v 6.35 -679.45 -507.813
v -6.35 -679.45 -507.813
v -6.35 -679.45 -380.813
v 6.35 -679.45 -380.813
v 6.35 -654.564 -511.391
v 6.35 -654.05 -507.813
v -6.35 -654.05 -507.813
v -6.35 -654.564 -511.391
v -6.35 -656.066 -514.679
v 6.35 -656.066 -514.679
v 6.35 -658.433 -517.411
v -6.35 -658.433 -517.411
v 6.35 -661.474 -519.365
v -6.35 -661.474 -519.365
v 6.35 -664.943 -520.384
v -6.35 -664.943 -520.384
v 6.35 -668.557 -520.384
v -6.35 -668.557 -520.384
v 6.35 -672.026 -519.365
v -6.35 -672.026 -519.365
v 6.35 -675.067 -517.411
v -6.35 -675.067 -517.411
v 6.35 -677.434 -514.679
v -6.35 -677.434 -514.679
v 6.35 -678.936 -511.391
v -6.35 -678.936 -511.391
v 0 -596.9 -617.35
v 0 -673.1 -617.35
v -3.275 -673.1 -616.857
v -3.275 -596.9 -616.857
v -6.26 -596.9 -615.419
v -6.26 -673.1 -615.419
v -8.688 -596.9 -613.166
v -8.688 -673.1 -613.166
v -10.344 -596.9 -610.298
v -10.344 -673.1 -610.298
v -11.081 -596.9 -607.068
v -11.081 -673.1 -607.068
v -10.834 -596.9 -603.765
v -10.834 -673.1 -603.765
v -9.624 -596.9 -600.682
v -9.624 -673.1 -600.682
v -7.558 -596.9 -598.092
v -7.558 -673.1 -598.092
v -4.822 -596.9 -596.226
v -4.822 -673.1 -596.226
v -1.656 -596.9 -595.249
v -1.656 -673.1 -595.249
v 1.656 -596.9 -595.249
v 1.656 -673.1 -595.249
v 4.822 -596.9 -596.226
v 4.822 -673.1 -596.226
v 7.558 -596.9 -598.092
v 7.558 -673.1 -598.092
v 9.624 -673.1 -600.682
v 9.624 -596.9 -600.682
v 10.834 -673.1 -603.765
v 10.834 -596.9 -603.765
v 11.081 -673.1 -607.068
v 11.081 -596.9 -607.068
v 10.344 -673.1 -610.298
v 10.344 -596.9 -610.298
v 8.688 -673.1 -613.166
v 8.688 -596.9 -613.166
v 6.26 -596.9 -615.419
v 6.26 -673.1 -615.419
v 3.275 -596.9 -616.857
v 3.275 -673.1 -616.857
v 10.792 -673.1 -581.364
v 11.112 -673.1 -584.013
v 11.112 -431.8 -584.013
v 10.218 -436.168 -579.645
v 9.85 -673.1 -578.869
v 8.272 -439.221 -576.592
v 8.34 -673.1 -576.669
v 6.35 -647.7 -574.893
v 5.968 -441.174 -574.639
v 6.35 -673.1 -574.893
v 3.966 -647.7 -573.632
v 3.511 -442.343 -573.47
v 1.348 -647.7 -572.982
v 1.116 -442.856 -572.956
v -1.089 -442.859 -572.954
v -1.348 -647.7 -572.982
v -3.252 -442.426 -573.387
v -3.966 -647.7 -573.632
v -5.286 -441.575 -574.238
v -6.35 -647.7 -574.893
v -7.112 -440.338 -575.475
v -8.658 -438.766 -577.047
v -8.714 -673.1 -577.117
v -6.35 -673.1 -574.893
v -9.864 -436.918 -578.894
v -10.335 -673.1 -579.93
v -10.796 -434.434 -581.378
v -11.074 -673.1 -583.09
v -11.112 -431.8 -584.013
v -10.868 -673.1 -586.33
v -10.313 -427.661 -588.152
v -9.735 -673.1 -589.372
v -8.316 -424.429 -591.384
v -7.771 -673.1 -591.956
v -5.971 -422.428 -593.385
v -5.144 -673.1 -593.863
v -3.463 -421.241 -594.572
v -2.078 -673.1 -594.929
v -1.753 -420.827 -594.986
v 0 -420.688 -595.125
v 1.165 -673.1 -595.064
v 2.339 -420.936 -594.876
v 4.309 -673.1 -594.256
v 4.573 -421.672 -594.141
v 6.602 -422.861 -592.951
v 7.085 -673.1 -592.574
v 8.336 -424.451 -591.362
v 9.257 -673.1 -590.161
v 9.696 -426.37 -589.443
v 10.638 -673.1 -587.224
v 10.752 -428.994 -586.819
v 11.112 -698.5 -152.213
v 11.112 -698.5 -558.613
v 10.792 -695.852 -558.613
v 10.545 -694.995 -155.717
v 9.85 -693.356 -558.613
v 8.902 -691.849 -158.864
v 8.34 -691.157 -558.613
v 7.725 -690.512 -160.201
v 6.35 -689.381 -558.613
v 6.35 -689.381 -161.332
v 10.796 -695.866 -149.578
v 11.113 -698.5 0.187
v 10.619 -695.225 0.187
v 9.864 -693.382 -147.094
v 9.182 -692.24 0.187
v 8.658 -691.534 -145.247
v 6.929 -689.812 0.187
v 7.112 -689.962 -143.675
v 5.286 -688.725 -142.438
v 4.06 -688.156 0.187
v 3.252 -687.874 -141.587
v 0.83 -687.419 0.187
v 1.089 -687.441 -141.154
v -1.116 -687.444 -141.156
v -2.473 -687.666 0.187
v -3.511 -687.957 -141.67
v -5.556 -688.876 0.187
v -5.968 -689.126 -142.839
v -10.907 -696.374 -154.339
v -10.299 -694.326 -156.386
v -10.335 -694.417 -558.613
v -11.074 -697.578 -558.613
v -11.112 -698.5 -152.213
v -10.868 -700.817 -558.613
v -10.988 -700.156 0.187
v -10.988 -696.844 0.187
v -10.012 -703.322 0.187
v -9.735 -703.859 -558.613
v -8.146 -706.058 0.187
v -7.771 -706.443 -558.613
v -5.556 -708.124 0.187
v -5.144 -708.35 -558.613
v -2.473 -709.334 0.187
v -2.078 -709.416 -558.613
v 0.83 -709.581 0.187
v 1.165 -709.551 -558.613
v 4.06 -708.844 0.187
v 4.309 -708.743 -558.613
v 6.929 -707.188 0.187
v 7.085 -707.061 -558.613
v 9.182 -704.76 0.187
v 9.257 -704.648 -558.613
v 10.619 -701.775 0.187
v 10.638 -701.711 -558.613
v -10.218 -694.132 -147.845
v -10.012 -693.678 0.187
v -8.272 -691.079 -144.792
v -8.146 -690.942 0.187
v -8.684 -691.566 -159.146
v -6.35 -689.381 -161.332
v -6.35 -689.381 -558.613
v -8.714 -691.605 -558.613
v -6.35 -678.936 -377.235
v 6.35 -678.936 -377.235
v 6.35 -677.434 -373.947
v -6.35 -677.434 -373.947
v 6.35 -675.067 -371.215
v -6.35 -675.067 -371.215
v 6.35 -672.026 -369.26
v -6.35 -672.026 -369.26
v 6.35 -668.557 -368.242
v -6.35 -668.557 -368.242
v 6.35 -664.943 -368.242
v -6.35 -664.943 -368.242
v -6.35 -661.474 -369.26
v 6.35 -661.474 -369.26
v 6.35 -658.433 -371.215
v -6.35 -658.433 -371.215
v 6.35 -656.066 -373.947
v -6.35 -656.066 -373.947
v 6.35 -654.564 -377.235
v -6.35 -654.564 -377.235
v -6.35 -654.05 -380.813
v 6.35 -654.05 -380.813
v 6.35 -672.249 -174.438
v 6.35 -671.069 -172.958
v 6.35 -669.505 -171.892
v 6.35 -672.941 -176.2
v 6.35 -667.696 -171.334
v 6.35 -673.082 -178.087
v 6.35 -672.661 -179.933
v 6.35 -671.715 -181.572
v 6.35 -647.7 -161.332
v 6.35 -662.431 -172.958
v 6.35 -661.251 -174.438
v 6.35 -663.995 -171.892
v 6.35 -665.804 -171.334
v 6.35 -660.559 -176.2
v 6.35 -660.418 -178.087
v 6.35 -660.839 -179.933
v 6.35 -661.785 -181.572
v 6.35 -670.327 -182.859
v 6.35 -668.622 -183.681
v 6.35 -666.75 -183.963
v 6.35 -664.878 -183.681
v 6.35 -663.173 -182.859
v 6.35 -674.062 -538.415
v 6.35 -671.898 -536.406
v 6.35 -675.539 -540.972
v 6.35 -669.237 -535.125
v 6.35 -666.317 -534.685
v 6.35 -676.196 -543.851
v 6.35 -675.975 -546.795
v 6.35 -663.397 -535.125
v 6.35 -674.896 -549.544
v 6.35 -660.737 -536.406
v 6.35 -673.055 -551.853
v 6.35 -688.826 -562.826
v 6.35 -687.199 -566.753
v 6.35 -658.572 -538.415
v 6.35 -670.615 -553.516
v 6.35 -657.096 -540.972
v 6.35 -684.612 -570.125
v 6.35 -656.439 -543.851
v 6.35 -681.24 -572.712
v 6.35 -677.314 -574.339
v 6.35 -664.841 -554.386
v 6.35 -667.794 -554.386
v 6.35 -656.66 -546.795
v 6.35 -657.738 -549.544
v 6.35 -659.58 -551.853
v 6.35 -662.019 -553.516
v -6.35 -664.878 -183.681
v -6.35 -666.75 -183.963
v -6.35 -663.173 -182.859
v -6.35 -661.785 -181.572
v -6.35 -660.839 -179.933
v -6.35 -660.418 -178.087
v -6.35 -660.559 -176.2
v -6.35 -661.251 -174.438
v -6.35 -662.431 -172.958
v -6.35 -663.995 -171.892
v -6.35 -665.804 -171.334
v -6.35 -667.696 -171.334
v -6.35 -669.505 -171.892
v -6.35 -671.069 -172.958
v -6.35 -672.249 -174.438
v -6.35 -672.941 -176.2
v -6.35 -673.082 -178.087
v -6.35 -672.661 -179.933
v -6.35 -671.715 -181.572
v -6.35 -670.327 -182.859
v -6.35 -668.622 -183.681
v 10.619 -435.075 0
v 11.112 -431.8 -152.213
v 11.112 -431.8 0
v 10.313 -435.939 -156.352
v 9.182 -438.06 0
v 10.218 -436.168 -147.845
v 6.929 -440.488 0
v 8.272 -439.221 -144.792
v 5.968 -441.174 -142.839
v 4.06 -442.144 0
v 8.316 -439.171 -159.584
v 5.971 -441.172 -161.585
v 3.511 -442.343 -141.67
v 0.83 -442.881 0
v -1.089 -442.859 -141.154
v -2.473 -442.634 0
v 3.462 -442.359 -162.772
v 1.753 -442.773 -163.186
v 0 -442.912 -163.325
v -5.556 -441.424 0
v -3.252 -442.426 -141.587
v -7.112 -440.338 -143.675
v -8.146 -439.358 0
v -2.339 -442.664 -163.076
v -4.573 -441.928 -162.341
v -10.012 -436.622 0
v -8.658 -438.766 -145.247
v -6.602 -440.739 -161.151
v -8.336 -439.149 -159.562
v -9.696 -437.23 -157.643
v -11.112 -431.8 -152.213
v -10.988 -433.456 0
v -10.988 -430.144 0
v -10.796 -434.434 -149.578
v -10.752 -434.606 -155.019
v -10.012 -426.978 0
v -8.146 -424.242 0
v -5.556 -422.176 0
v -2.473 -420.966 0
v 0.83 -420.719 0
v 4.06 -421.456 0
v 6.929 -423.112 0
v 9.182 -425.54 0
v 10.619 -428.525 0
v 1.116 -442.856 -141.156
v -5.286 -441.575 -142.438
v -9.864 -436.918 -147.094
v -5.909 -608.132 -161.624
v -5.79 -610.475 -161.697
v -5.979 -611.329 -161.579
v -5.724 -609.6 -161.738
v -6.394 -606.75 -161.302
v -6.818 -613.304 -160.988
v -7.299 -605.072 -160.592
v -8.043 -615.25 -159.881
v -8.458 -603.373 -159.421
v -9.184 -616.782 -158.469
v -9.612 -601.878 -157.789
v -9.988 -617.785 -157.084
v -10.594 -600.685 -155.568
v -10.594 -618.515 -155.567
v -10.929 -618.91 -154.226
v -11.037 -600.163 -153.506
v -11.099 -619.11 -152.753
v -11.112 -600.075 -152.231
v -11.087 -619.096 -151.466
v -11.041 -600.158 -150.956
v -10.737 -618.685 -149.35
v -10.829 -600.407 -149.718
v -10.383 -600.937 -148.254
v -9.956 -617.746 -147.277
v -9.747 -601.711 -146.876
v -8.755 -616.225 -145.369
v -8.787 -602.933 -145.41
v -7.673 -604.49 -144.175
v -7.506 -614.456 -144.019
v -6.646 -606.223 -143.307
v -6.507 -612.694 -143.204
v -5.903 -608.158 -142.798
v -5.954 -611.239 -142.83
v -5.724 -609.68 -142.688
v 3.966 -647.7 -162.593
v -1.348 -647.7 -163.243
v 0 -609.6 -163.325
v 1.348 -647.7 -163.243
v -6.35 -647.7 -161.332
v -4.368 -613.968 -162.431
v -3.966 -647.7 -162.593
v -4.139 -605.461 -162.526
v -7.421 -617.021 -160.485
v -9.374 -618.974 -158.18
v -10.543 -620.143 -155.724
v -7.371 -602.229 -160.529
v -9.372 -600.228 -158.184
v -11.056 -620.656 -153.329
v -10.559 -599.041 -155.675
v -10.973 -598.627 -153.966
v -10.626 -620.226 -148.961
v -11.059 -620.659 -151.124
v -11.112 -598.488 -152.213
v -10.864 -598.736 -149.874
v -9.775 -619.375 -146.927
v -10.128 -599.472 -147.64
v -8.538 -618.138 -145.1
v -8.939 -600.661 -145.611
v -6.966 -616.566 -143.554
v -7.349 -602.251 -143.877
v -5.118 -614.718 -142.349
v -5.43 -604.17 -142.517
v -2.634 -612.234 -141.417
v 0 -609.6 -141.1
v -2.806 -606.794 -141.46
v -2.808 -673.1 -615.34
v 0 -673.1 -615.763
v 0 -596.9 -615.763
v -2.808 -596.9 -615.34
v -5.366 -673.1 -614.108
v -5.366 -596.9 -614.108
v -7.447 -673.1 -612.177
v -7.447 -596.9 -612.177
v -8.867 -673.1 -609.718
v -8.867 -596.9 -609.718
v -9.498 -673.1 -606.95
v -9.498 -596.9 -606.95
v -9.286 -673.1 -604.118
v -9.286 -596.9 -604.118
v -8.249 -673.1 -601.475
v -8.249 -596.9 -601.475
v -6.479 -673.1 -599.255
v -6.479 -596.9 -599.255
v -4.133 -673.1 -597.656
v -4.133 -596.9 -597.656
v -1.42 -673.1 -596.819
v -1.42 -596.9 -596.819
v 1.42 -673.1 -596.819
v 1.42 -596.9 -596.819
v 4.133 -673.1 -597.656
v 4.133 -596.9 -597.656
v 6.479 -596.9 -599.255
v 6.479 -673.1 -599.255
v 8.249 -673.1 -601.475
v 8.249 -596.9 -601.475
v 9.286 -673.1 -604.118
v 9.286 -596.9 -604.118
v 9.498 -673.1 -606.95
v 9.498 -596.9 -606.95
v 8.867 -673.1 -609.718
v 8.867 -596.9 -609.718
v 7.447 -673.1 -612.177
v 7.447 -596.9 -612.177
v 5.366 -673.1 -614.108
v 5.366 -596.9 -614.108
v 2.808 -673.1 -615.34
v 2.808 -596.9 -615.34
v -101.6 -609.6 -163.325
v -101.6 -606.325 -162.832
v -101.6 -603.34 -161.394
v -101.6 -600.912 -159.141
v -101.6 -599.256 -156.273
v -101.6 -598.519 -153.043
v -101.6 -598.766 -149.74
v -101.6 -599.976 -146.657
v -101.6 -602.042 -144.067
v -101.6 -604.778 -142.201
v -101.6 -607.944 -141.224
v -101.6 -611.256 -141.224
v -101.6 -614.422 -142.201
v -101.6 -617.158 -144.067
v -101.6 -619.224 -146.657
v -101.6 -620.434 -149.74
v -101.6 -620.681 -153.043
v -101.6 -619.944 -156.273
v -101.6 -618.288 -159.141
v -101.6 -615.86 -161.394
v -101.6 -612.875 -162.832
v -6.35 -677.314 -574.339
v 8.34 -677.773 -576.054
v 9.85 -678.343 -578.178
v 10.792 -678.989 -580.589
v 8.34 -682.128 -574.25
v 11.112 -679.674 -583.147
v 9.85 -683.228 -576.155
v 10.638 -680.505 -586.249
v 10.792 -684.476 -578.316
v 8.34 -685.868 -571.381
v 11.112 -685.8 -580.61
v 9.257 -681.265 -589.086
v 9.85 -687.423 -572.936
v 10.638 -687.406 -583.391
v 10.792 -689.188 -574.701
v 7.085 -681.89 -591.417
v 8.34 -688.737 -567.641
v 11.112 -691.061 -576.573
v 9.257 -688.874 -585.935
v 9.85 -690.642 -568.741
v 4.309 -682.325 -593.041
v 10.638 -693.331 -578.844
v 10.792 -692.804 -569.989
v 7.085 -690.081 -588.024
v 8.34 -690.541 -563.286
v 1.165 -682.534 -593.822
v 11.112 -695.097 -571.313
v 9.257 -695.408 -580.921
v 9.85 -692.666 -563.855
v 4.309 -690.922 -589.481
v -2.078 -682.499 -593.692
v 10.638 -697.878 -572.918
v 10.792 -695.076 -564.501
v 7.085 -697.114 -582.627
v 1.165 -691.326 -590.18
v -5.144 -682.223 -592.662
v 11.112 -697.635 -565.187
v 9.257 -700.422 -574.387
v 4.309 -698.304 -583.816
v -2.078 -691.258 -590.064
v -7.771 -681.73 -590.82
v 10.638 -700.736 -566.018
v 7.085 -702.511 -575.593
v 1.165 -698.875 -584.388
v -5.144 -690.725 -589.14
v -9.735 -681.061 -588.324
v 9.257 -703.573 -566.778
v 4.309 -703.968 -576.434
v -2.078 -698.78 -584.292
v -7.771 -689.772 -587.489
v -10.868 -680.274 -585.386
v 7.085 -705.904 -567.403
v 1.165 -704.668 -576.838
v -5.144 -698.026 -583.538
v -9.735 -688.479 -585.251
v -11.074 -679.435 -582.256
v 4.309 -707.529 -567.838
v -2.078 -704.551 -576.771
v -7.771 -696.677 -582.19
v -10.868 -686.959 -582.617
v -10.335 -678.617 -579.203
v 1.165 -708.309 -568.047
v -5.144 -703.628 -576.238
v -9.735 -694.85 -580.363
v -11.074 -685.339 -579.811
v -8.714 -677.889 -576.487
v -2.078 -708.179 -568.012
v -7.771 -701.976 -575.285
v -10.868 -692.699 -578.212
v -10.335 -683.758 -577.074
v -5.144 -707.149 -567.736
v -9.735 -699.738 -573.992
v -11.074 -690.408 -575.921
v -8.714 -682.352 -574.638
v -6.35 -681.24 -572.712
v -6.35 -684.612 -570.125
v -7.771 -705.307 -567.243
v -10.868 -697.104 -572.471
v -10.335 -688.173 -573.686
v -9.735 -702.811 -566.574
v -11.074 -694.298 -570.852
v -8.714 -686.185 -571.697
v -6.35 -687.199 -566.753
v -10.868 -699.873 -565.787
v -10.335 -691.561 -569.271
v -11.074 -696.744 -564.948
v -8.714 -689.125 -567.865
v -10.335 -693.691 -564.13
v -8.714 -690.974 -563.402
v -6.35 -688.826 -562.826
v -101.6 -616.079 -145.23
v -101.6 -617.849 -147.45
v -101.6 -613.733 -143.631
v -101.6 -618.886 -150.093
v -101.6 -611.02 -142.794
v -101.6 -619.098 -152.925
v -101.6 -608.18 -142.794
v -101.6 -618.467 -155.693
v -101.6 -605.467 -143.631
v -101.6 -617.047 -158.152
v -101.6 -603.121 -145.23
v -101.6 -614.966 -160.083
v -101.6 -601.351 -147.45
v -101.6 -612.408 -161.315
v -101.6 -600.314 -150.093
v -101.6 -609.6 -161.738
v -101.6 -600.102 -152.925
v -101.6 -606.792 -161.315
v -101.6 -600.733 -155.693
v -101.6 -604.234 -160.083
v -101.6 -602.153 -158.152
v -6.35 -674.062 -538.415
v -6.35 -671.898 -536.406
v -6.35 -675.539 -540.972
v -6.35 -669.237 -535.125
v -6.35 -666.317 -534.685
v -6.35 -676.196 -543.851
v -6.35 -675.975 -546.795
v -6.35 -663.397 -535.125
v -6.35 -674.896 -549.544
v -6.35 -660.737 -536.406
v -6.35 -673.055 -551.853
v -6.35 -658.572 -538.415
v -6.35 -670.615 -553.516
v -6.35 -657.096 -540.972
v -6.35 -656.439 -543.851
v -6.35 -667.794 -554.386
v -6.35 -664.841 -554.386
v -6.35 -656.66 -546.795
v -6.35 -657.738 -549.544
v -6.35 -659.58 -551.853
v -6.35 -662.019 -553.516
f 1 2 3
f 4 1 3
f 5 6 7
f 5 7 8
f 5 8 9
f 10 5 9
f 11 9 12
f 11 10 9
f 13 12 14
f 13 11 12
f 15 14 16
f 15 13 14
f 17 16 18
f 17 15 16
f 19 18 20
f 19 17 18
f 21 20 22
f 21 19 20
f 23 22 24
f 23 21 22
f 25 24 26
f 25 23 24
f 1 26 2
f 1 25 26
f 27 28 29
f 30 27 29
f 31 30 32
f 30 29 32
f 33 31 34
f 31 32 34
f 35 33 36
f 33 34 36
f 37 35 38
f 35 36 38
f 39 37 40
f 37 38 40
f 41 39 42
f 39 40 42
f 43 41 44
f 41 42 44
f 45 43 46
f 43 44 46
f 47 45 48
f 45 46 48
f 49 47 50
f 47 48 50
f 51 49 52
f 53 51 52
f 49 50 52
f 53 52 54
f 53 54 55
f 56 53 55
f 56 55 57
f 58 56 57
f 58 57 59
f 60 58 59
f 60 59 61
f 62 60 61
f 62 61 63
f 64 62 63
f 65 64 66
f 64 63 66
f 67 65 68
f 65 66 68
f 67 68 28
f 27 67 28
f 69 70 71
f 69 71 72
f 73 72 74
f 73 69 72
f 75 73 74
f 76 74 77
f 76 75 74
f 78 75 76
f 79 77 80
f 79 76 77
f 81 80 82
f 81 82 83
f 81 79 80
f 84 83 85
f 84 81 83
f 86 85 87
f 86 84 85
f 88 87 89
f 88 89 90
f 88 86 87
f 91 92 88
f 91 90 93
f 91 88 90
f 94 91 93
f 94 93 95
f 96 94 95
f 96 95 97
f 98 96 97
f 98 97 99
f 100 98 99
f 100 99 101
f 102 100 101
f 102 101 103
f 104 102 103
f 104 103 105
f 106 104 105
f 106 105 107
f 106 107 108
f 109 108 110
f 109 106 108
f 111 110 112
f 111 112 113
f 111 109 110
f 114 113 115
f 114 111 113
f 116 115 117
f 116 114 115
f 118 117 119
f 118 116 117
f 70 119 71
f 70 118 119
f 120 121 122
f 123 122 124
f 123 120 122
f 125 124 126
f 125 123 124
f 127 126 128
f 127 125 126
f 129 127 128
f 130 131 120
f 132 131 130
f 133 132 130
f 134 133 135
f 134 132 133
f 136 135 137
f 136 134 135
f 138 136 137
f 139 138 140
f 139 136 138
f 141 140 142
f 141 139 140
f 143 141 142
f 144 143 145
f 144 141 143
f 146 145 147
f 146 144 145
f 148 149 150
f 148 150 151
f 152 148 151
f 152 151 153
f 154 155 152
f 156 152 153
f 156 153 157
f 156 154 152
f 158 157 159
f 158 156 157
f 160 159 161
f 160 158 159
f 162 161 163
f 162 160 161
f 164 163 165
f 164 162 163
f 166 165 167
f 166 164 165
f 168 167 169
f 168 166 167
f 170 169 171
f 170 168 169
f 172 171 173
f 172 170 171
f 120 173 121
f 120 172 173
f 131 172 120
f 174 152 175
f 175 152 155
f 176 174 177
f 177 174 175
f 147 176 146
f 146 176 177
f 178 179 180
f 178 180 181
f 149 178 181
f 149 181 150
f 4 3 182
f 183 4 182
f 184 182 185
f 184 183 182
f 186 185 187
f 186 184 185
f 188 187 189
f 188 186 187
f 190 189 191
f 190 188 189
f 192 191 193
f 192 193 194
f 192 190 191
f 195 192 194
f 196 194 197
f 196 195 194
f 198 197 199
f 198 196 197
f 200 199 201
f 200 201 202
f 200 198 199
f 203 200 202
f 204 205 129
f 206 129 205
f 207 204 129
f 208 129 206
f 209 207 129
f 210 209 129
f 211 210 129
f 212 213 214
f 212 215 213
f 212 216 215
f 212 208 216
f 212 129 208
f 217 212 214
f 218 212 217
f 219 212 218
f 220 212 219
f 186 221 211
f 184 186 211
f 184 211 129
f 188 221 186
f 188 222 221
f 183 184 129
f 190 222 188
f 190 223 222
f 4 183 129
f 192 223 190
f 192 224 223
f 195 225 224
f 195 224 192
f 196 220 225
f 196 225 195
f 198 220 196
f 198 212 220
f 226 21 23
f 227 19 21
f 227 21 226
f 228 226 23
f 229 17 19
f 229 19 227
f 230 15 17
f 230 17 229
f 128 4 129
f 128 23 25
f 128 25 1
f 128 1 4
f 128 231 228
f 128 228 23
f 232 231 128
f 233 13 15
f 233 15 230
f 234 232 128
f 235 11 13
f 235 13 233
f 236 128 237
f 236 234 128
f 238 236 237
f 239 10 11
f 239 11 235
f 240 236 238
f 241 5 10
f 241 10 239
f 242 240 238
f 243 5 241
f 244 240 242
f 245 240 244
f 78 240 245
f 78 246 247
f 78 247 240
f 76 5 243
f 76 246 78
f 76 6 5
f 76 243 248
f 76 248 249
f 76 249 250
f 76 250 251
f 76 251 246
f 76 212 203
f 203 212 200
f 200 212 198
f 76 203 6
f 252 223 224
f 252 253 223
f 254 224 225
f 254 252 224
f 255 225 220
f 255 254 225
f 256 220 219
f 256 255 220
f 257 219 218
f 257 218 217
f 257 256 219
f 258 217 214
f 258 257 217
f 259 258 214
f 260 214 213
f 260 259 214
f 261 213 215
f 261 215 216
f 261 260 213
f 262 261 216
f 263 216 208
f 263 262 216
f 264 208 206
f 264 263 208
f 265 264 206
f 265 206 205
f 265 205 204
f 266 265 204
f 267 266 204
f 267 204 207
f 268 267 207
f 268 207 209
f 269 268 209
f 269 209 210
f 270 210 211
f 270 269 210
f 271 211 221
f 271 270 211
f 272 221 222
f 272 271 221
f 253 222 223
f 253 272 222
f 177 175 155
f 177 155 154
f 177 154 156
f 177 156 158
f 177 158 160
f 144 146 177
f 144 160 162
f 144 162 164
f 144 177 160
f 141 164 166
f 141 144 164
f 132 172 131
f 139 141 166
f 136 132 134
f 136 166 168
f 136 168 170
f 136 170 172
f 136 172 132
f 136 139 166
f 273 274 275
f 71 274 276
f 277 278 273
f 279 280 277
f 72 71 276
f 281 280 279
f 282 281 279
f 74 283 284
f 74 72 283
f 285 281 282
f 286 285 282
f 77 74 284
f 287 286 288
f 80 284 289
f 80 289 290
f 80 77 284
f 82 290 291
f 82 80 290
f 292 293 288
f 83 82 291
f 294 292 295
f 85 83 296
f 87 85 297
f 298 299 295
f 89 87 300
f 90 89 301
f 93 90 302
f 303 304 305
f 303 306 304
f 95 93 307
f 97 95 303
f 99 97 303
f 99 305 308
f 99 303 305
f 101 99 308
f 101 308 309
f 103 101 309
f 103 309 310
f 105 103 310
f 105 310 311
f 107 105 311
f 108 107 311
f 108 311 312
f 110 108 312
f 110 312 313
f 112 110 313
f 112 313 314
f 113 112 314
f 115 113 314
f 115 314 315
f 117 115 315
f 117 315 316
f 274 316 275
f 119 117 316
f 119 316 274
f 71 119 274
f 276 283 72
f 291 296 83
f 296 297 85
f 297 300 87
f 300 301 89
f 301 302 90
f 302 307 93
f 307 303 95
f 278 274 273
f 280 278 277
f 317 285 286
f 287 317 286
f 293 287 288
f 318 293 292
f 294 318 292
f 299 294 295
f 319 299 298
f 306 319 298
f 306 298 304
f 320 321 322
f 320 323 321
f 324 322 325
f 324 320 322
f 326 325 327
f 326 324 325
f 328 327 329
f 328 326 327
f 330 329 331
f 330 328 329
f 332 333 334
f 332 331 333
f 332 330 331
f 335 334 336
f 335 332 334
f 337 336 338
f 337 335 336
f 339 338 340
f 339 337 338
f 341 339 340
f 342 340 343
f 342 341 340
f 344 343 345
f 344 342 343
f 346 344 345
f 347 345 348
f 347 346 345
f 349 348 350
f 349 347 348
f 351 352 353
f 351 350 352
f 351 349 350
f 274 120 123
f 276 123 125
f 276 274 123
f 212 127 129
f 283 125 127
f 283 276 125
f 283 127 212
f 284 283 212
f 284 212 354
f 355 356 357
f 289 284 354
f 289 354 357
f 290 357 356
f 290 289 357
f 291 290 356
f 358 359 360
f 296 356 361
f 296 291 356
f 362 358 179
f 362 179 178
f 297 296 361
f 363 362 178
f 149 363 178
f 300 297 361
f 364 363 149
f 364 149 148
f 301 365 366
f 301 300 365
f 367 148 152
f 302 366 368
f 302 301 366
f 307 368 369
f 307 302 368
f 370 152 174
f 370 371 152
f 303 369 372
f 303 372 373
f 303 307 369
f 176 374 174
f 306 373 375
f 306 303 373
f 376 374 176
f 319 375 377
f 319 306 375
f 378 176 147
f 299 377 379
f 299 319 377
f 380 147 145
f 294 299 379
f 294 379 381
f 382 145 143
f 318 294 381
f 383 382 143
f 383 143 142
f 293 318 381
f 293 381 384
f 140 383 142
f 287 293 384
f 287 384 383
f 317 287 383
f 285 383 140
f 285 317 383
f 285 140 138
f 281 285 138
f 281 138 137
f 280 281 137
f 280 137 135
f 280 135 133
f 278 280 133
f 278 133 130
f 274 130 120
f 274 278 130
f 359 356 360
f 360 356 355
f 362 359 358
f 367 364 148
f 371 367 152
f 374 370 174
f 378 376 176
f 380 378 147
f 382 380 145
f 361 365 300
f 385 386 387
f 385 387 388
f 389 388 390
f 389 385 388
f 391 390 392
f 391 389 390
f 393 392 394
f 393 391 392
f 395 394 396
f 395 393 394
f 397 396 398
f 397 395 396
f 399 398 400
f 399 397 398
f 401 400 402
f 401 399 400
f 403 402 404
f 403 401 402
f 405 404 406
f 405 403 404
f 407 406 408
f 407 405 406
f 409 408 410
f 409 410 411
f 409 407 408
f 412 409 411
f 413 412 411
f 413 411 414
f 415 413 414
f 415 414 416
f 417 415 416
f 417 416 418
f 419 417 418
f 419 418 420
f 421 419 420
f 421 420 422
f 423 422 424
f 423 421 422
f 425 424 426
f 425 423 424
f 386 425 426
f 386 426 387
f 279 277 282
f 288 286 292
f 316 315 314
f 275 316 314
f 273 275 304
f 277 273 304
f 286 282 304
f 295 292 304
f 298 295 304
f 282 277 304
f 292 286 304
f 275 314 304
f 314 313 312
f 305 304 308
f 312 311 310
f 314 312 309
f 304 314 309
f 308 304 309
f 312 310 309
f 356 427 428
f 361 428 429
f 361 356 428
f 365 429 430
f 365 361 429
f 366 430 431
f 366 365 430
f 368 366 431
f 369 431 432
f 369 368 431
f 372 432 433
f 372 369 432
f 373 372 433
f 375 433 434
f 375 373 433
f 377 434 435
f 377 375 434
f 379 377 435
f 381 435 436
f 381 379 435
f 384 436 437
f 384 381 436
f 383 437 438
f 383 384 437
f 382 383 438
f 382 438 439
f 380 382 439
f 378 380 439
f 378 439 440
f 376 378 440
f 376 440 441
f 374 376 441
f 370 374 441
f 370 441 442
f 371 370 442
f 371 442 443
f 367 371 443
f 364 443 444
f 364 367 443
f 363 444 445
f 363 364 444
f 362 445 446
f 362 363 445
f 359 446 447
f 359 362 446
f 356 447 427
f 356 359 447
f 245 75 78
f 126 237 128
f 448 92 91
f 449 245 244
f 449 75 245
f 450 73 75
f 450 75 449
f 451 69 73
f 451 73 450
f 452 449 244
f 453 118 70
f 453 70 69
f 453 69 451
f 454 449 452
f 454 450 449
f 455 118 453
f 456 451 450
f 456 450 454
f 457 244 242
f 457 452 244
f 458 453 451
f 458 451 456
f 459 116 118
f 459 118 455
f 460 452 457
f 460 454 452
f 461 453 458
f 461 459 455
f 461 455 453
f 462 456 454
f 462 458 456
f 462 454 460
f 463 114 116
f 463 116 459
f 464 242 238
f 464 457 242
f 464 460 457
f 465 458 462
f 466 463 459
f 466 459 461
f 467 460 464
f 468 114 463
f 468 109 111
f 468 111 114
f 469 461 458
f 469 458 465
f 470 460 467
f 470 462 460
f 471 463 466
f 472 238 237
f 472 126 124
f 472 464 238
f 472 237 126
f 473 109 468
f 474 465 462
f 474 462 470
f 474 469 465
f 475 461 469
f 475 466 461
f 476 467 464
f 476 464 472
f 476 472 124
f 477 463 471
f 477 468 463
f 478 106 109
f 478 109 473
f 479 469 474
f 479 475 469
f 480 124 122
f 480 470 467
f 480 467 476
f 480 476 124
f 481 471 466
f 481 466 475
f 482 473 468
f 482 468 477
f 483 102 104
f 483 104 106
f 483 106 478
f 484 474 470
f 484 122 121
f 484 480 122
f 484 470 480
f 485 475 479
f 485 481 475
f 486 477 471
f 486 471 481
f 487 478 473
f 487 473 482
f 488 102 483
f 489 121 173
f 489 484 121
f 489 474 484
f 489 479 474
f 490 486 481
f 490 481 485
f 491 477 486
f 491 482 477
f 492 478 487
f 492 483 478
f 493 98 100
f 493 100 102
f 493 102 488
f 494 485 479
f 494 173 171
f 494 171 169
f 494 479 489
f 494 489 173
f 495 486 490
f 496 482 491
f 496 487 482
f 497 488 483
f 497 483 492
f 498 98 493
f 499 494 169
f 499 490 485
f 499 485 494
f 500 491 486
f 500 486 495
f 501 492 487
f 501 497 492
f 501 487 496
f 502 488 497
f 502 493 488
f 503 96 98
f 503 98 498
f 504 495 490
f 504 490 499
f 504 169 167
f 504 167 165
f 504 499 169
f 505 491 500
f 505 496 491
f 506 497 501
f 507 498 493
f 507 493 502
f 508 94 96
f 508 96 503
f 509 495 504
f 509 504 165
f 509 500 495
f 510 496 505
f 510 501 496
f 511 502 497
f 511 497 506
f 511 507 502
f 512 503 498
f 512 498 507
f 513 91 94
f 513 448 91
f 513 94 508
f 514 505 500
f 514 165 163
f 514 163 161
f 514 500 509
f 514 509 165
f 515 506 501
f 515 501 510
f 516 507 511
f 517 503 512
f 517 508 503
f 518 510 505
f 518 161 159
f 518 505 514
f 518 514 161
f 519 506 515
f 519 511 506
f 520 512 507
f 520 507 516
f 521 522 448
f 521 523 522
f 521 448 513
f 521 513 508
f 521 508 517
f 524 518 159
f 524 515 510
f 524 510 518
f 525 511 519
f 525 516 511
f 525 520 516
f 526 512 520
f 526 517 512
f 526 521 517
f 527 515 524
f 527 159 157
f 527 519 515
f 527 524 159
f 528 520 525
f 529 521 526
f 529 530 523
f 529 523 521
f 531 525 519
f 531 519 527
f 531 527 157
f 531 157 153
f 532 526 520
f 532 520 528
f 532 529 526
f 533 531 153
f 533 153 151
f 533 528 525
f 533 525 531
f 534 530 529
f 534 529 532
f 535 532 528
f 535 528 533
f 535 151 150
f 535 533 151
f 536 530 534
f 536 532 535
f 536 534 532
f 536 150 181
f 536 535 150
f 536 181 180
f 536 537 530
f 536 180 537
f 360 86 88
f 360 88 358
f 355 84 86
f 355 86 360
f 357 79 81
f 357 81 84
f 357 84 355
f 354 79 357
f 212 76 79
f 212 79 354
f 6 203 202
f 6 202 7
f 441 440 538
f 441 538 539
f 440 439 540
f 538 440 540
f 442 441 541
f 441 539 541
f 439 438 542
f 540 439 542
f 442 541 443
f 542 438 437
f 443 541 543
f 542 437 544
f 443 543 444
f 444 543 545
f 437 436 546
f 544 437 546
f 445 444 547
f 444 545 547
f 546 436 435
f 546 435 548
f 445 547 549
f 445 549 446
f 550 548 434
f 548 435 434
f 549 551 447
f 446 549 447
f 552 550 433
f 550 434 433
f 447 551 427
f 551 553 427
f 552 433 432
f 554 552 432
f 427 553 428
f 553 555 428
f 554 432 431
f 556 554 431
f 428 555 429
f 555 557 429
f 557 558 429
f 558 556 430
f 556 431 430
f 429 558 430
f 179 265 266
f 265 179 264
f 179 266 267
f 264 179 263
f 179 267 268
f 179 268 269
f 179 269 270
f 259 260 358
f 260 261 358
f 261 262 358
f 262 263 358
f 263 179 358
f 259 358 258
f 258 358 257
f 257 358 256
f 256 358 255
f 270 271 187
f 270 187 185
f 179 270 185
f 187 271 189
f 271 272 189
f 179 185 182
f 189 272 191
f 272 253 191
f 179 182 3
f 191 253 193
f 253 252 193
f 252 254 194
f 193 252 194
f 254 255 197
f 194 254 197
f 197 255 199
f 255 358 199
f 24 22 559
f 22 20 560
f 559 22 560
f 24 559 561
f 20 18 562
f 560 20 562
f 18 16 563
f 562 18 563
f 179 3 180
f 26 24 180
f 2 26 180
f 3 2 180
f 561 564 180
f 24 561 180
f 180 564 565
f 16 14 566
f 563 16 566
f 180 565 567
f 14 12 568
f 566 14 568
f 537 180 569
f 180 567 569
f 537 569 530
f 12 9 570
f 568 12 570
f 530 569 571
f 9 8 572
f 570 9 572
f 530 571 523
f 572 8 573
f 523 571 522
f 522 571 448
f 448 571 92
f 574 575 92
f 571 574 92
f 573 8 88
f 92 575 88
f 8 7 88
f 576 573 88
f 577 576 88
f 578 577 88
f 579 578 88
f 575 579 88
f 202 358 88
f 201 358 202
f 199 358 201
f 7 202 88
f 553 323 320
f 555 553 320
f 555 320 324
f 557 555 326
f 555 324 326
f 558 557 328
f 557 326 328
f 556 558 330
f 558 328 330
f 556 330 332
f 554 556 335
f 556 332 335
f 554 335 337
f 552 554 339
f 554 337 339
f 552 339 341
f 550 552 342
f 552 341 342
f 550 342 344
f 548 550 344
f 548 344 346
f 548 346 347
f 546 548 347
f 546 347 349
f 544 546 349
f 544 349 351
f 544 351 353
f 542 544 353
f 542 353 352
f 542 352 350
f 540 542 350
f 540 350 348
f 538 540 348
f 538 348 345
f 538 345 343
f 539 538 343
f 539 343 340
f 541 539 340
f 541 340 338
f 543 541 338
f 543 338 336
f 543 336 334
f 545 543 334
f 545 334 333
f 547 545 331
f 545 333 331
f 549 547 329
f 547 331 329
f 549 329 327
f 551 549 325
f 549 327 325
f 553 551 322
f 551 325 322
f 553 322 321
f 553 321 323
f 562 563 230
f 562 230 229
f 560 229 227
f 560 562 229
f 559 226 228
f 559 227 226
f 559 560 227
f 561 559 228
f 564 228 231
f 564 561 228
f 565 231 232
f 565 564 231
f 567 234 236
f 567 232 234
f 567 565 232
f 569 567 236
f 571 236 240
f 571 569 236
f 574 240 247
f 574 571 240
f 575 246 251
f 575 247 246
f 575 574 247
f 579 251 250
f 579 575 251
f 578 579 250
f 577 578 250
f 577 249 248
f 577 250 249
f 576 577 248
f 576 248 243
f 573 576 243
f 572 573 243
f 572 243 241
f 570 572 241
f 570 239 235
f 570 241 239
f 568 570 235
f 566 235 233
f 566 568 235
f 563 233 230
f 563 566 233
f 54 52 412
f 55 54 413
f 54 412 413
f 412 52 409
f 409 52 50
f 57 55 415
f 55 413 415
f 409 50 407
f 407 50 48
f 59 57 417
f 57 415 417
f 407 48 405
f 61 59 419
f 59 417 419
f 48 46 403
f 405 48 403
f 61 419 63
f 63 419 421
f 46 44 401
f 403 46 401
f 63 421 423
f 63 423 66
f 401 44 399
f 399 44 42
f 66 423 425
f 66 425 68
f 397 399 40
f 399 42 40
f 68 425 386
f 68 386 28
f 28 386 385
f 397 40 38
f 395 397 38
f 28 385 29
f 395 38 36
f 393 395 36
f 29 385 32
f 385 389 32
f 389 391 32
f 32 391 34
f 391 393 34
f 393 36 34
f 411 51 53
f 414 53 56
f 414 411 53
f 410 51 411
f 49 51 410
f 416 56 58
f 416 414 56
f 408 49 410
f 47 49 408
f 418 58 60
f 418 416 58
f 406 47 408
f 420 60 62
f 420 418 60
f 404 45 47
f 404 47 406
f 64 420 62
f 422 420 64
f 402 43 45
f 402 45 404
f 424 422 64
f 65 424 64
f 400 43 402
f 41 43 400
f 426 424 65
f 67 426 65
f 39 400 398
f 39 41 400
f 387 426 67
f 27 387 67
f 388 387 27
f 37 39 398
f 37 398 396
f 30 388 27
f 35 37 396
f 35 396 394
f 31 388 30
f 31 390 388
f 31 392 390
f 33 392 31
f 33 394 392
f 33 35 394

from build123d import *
from build123d.topology import SkipClean

# Parameters (mm, degrees)
SKETCH3_R               = 11.1125
SKETCH3_8_R             = 11.1125
SKETCH11_R              = 6.35
BOSS_EXTRUDE2_DEPTH     = 6.35
SKETCH12_R              = 11.1125
SKETCH12_R_2            = 9.525
BOSS_EXTRUDE3_DEPTH     = 101.6
SKETCH13_R              = 11.1125
SKETCH13_R_2            = 9.525
BOSS_EXTRUDE4_DEPTH     = 76.2
CUT_EXTRUDE1_DEPTH      = 947.041134319
CUT_EXTRUDE1_DEPTH_BACK = 947.041134319
SKETCH14_R              = 9.906


with BuildPart() as part:
    # Sweep1: sweep along a path in Sketch1
    with BuildLine(Plane(origin=(0, 0, 0), x_dir=(0, 0, -1), z_dir=(1, 0, 0))) as sweep1_path:
        Line((0, -431.8), (152.212779539, -431.8))
        Line((152.212779539, -431.8), (584.012779539, -431.8))
        Line((584.012779539, -431.8), (584.012779539, -673.1))
        ThreePointArc((584.012779539, -673.1), (576.573291781, -691.060512242), (558.612779539, -698.5))
        Line((558.612779539, -698.5), (152.212779539, -698.5))
        Line((152.212779539, -698.5), (-0.187220461, -698.5))
    # Sketch3 → Sweep1 (sweep)
    with BuildSketch(Plane.XY):
        with Locations((0, -698.5)):
            Circle(SKETCH3_R)
    sweep(path=sweep1_path.line, transition=Transition.RIGHT)

    # Sweep2: sweep along a path in Sketch1<23>
    with BuildLine(Plane(origin=(0, 0, 0), x_dir=(0, 0, -1), z_dir=(1, 0, 0))) as sweep2_path:
        Line((-0.187220461, -698.5), (152.212779539, -698.5))
        Line((152.212779539, -698.5), (152.212779539, -431.8))
    # Sketch3<8> → Sweep2 (sweep)
    with BuildSketch(Plane.XY):
        with Locations((0, -698.5)):
            Circle(SKETCH3_8_R)
    sweep(path=sweep2_path.line, transition=Transition.RIGHT)

    # Sketch11 → Boss-Extrude2 (add, symmetric)
    with BuildSketch(Plane(origin=(0, 0, 0), x_dir=(0, 0, -1), z_dir=(1, 0, 0))):
        with BuildLine():
            Line((584.012779539, -673.1), (584.012779539, -647.7))
            Line((584.012779539, -647.7), (152.212779539, -647.7))
            Line((152.212779539, -647.7), (152.212779539, -698.5))
            Line((152.212779539, -698.5), (558.612779539, -698.5))
            ThreePointArc((558.612779539, -698.5), (576.573291781, -691.060512242), (584.012779539, -673.1))
        make_face()
        with BuildLine():
            ThreePointArc((380.812779539, -679.45), (368.112779539, -666.75), (380.812779539, -654.05))
            Line((380.812779539, -654.05), (507.812779539, -654.05))
            ThreePointArc((507.812779539, -654.05), (520.512779539, -666.75), (507.812779539, -679.45))
            Line((507.812779539, -679.45), (380.812779539, -679.45))
        make_face(mode=Mode.SUBTRACT)
        with Locations((177.612779539, -666.75)):
            Circle(SKETCH11_R, mode=Mode.SUBTRACT)
    extrude(amount=BOSS_EXTRUDE2_DEPTH, both=True)

    # Sketch12 → Boss-Extrude3 (add)
    with SkipClean():  # the faces are left unmerged after this step: merging them gives an invalid solid
        with BuildSketch(Plane(origin=(0, 0, 0), x_dir=(0, 0, -1), z_dir=(1, 0, 0))):
            with Locations((152.212779539, -609.6)):
                Circle(SKETCH12_R)
            with Locations((152.212779539, -609.6)):
                Circle(SKETCH12_R_2, mode=Mode.SUBTRACT)
        extrude(amount=-BOSS_EXTRUDE3_DEPTH)

    # Sketch14 → Cut-Extrude1 (cut, two sides: drawn at the far end of the back side and taken through both)
    with SkipClean():  # the faces are left unmerged after this step: merging them gives an invalid solid
        with BuildSketch(Plane(origin=(0, 0, 0), x_dir=(0, 0, -1), z_dir=(1, 0, 0)).offset(-CUT_EXTRUDE1_DEPTH_BACK)):
            with Locations((544.591086338, -666.317306799)):
                Circle(SKETCH14_R)
        extrude(amount=CUT_EXTRUDE1_DEPTH + CUT_EXTRUDE1_DEPTH_BACK, mode=Mode.SUBTRACT)


with BuildPart() as body_2:
    # Sketch13 → Boss-Extrude4 (new body)
    with BuildSketch(Plane(origin=(0, -673.1, 0), x_dir=(1, 0, 0), z_dir=(0, 1, 0))):
        with Locations((0, 606.237779539)):
            Circle(SKETCH13_R)
        with Locations((0, 606.237779539)):
            Circle(SKETCH13_R_2, mode=Mode.SUBTRACT)
    extrude(amount=BOSS_EXTRUDE4_DEPTH)


solid = Compound([part.part, body_2.part])
